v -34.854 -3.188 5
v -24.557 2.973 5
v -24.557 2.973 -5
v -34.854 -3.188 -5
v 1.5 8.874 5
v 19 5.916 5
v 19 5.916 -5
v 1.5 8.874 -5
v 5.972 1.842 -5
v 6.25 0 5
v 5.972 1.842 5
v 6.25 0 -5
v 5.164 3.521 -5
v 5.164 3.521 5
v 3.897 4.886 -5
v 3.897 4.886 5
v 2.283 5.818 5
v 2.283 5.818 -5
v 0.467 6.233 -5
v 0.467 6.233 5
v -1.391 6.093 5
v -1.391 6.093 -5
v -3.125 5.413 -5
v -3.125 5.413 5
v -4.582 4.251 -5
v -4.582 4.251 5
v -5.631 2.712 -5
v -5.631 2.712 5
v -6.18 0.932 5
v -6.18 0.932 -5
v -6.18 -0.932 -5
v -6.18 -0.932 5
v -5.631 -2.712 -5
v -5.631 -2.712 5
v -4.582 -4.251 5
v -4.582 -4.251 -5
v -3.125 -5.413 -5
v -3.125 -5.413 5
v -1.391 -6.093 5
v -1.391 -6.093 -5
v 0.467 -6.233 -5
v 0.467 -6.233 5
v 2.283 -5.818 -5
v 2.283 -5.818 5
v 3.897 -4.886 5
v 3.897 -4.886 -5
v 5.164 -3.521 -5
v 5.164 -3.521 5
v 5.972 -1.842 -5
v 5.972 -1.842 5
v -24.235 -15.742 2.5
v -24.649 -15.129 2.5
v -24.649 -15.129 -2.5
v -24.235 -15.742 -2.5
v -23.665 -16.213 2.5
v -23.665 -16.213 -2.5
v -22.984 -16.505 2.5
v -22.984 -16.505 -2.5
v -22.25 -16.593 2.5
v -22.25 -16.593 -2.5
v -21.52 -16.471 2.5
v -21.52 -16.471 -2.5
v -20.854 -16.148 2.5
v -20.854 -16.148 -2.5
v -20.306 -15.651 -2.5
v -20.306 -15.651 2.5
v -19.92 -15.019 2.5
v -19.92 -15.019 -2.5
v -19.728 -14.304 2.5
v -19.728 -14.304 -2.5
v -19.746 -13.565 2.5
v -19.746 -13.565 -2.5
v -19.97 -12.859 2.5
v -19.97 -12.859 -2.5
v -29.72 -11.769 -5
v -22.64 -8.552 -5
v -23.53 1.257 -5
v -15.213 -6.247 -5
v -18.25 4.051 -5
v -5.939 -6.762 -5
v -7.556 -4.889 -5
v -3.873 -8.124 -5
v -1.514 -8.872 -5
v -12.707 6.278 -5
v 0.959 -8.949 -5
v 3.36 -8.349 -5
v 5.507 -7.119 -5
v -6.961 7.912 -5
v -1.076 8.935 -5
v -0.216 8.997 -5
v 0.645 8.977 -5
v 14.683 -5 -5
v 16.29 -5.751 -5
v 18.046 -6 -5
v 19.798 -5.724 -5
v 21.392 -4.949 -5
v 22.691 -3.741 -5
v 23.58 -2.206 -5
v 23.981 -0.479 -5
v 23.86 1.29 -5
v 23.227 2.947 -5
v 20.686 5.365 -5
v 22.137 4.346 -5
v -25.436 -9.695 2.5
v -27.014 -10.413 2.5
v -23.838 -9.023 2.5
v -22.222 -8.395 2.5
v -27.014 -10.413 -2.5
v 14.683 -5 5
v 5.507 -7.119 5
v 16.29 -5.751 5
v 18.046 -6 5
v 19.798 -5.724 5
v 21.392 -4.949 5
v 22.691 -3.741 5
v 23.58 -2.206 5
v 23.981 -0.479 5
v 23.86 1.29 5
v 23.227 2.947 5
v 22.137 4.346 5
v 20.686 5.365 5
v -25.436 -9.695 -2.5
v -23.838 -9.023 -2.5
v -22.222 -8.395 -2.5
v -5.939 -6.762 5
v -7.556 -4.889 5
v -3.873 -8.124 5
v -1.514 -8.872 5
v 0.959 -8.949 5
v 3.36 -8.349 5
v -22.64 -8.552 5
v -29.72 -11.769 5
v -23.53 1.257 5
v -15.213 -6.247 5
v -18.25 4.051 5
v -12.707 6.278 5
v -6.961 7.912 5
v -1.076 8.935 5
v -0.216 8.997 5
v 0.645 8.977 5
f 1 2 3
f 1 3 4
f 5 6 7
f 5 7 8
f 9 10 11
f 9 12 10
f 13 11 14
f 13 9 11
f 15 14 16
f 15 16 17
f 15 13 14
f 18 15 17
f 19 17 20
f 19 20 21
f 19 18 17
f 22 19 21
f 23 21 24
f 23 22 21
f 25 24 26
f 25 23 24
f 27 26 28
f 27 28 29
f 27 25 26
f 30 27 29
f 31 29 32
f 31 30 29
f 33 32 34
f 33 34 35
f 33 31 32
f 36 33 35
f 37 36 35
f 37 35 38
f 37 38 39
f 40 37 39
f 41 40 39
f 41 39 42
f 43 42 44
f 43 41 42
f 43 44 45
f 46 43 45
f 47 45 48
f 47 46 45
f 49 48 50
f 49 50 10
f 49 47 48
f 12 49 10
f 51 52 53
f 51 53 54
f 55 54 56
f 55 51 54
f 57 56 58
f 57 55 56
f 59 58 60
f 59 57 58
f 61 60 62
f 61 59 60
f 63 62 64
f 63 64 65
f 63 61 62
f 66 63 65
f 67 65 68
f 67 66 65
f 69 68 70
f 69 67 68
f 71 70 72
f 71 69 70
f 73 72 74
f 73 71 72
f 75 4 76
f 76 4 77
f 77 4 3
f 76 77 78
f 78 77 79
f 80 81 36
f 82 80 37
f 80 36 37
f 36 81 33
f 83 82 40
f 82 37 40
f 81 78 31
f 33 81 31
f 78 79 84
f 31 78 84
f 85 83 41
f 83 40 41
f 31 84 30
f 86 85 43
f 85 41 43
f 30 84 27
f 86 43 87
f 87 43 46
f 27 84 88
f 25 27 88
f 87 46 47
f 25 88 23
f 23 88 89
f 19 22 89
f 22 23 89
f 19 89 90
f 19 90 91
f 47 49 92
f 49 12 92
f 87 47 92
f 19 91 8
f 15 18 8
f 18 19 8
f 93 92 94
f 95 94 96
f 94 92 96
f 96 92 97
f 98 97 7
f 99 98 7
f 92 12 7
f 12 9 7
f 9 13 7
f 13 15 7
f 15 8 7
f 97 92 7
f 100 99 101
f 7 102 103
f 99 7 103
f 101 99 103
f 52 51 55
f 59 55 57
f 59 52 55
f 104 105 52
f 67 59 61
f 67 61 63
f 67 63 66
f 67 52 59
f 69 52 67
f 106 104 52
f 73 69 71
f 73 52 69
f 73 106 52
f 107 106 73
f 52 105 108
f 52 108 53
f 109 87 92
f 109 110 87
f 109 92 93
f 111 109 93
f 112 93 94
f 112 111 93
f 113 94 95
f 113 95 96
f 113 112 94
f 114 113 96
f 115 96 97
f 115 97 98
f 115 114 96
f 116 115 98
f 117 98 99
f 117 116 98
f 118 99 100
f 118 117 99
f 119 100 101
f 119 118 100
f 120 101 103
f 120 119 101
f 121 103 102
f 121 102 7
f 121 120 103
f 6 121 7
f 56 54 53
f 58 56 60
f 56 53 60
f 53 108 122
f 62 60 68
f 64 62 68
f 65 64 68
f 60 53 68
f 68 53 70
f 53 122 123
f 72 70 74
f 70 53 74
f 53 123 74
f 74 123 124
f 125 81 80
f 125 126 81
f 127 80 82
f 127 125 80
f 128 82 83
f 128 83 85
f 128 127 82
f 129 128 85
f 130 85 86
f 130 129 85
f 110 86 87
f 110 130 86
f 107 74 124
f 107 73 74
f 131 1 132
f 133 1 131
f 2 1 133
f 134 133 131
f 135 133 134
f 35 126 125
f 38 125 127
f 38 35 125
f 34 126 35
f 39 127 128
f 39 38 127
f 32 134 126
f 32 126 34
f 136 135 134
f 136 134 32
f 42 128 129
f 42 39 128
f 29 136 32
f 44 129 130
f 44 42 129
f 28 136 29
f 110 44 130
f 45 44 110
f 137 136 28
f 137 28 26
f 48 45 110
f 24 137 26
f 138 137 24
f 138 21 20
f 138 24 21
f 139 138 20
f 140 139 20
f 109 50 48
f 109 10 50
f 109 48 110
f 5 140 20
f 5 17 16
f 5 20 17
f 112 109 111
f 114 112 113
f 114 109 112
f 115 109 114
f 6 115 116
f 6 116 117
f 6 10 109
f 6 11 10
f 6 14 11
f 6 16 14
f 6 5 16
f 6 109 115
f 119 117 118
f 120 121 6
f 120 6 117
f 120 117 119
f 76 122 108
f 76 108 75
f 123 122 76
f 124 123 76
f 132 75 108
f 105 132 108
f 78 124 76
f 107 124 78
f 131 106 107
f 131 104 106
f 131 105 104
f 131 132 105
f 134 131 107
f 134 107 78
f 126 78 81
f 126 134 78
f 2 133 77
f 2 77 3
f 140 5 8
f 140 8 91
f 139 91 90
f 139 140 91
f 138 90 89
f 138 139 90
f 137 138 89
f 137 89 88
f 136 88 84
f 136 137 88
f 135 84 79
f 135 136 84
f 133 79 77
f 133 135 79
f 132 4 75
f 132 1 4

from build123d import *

# Parameters (mm, degrees)
SKETCH1_R           = 6.25
BOSS_EXTRUDE1_DEPTH = 5
BOSS_EXTRUDE2_DEPTH = 2.5


with BuildPart() as part:
    # Sketch1 → Boss-Extrude1 (new body, symmetric)
    with BuildSketch(Plane.XY):
        with BuildLine():
            ThreePointArc((14.68337521, -5), (23.5795956, -2.206380053), (19, 5.916079783))
            Line((19, 5.916079783), (1.5, 8.874119675))
            ThreePointArc((1.5, 8.874119675), (0.214418855, 8.997445446), (-1.075577539, 8.935498473))
            ThreePointArc((-1.075577539, 8.935498473), (-12.706895621, 6.277711403), (-23.530140222, 1.256877932))
            Line((-23.530140222, 1.256877932), (-24.557036845, 2.973118977))
            Line((-24.557036845, 2.973118977), (-34.854483116, -3.188260762))
            Line((-34.854483116, -3.188260762), (-29.72, -11.769465988))
            ThreePointArc((-29.72, -11.769465988), (-18.962777108, -7.283193101), (-7.556000741, -4.889463447))
            ThreePointArc((-7.556000741, -4.889463447), (-1.513896416, -8.871759557), (5.50692712, -7.118549971))
            Line((5.50692712, -7.118549971), (14.68337521, -5))
        make_face()
        Circle(SKETCH1_R, mode=Mode.SUBTRACT)
    extrude(amount=BOSS_EXTRUDE1_DEPTH, both=True)

    # Sketch2 → Boss-Extrude2 (add, symmetric)
    with BuildSketch(Plane.XY):
        with BuildLine():
            ThreePointArc((-22.221689741, -8.394920516), (-24.639151754, -9.353488219), (-27.014289175, -10.412590129))
            Line((-27.014289175, -10.412590129), (-24.649285993, -15.128581404))
            ThreePointArc((-24.649285993, -15.128581404), (-21.175329825, -16.33341689), (-19.970494339, -12.859460723))
            Line((-19.970494339, -12.859460723), (-22.221689741, -8.394920516))
        make_face()
    extrude(amount=BOSS_EXTRUDE2_DEPTH, both=True)


solid = part.part
